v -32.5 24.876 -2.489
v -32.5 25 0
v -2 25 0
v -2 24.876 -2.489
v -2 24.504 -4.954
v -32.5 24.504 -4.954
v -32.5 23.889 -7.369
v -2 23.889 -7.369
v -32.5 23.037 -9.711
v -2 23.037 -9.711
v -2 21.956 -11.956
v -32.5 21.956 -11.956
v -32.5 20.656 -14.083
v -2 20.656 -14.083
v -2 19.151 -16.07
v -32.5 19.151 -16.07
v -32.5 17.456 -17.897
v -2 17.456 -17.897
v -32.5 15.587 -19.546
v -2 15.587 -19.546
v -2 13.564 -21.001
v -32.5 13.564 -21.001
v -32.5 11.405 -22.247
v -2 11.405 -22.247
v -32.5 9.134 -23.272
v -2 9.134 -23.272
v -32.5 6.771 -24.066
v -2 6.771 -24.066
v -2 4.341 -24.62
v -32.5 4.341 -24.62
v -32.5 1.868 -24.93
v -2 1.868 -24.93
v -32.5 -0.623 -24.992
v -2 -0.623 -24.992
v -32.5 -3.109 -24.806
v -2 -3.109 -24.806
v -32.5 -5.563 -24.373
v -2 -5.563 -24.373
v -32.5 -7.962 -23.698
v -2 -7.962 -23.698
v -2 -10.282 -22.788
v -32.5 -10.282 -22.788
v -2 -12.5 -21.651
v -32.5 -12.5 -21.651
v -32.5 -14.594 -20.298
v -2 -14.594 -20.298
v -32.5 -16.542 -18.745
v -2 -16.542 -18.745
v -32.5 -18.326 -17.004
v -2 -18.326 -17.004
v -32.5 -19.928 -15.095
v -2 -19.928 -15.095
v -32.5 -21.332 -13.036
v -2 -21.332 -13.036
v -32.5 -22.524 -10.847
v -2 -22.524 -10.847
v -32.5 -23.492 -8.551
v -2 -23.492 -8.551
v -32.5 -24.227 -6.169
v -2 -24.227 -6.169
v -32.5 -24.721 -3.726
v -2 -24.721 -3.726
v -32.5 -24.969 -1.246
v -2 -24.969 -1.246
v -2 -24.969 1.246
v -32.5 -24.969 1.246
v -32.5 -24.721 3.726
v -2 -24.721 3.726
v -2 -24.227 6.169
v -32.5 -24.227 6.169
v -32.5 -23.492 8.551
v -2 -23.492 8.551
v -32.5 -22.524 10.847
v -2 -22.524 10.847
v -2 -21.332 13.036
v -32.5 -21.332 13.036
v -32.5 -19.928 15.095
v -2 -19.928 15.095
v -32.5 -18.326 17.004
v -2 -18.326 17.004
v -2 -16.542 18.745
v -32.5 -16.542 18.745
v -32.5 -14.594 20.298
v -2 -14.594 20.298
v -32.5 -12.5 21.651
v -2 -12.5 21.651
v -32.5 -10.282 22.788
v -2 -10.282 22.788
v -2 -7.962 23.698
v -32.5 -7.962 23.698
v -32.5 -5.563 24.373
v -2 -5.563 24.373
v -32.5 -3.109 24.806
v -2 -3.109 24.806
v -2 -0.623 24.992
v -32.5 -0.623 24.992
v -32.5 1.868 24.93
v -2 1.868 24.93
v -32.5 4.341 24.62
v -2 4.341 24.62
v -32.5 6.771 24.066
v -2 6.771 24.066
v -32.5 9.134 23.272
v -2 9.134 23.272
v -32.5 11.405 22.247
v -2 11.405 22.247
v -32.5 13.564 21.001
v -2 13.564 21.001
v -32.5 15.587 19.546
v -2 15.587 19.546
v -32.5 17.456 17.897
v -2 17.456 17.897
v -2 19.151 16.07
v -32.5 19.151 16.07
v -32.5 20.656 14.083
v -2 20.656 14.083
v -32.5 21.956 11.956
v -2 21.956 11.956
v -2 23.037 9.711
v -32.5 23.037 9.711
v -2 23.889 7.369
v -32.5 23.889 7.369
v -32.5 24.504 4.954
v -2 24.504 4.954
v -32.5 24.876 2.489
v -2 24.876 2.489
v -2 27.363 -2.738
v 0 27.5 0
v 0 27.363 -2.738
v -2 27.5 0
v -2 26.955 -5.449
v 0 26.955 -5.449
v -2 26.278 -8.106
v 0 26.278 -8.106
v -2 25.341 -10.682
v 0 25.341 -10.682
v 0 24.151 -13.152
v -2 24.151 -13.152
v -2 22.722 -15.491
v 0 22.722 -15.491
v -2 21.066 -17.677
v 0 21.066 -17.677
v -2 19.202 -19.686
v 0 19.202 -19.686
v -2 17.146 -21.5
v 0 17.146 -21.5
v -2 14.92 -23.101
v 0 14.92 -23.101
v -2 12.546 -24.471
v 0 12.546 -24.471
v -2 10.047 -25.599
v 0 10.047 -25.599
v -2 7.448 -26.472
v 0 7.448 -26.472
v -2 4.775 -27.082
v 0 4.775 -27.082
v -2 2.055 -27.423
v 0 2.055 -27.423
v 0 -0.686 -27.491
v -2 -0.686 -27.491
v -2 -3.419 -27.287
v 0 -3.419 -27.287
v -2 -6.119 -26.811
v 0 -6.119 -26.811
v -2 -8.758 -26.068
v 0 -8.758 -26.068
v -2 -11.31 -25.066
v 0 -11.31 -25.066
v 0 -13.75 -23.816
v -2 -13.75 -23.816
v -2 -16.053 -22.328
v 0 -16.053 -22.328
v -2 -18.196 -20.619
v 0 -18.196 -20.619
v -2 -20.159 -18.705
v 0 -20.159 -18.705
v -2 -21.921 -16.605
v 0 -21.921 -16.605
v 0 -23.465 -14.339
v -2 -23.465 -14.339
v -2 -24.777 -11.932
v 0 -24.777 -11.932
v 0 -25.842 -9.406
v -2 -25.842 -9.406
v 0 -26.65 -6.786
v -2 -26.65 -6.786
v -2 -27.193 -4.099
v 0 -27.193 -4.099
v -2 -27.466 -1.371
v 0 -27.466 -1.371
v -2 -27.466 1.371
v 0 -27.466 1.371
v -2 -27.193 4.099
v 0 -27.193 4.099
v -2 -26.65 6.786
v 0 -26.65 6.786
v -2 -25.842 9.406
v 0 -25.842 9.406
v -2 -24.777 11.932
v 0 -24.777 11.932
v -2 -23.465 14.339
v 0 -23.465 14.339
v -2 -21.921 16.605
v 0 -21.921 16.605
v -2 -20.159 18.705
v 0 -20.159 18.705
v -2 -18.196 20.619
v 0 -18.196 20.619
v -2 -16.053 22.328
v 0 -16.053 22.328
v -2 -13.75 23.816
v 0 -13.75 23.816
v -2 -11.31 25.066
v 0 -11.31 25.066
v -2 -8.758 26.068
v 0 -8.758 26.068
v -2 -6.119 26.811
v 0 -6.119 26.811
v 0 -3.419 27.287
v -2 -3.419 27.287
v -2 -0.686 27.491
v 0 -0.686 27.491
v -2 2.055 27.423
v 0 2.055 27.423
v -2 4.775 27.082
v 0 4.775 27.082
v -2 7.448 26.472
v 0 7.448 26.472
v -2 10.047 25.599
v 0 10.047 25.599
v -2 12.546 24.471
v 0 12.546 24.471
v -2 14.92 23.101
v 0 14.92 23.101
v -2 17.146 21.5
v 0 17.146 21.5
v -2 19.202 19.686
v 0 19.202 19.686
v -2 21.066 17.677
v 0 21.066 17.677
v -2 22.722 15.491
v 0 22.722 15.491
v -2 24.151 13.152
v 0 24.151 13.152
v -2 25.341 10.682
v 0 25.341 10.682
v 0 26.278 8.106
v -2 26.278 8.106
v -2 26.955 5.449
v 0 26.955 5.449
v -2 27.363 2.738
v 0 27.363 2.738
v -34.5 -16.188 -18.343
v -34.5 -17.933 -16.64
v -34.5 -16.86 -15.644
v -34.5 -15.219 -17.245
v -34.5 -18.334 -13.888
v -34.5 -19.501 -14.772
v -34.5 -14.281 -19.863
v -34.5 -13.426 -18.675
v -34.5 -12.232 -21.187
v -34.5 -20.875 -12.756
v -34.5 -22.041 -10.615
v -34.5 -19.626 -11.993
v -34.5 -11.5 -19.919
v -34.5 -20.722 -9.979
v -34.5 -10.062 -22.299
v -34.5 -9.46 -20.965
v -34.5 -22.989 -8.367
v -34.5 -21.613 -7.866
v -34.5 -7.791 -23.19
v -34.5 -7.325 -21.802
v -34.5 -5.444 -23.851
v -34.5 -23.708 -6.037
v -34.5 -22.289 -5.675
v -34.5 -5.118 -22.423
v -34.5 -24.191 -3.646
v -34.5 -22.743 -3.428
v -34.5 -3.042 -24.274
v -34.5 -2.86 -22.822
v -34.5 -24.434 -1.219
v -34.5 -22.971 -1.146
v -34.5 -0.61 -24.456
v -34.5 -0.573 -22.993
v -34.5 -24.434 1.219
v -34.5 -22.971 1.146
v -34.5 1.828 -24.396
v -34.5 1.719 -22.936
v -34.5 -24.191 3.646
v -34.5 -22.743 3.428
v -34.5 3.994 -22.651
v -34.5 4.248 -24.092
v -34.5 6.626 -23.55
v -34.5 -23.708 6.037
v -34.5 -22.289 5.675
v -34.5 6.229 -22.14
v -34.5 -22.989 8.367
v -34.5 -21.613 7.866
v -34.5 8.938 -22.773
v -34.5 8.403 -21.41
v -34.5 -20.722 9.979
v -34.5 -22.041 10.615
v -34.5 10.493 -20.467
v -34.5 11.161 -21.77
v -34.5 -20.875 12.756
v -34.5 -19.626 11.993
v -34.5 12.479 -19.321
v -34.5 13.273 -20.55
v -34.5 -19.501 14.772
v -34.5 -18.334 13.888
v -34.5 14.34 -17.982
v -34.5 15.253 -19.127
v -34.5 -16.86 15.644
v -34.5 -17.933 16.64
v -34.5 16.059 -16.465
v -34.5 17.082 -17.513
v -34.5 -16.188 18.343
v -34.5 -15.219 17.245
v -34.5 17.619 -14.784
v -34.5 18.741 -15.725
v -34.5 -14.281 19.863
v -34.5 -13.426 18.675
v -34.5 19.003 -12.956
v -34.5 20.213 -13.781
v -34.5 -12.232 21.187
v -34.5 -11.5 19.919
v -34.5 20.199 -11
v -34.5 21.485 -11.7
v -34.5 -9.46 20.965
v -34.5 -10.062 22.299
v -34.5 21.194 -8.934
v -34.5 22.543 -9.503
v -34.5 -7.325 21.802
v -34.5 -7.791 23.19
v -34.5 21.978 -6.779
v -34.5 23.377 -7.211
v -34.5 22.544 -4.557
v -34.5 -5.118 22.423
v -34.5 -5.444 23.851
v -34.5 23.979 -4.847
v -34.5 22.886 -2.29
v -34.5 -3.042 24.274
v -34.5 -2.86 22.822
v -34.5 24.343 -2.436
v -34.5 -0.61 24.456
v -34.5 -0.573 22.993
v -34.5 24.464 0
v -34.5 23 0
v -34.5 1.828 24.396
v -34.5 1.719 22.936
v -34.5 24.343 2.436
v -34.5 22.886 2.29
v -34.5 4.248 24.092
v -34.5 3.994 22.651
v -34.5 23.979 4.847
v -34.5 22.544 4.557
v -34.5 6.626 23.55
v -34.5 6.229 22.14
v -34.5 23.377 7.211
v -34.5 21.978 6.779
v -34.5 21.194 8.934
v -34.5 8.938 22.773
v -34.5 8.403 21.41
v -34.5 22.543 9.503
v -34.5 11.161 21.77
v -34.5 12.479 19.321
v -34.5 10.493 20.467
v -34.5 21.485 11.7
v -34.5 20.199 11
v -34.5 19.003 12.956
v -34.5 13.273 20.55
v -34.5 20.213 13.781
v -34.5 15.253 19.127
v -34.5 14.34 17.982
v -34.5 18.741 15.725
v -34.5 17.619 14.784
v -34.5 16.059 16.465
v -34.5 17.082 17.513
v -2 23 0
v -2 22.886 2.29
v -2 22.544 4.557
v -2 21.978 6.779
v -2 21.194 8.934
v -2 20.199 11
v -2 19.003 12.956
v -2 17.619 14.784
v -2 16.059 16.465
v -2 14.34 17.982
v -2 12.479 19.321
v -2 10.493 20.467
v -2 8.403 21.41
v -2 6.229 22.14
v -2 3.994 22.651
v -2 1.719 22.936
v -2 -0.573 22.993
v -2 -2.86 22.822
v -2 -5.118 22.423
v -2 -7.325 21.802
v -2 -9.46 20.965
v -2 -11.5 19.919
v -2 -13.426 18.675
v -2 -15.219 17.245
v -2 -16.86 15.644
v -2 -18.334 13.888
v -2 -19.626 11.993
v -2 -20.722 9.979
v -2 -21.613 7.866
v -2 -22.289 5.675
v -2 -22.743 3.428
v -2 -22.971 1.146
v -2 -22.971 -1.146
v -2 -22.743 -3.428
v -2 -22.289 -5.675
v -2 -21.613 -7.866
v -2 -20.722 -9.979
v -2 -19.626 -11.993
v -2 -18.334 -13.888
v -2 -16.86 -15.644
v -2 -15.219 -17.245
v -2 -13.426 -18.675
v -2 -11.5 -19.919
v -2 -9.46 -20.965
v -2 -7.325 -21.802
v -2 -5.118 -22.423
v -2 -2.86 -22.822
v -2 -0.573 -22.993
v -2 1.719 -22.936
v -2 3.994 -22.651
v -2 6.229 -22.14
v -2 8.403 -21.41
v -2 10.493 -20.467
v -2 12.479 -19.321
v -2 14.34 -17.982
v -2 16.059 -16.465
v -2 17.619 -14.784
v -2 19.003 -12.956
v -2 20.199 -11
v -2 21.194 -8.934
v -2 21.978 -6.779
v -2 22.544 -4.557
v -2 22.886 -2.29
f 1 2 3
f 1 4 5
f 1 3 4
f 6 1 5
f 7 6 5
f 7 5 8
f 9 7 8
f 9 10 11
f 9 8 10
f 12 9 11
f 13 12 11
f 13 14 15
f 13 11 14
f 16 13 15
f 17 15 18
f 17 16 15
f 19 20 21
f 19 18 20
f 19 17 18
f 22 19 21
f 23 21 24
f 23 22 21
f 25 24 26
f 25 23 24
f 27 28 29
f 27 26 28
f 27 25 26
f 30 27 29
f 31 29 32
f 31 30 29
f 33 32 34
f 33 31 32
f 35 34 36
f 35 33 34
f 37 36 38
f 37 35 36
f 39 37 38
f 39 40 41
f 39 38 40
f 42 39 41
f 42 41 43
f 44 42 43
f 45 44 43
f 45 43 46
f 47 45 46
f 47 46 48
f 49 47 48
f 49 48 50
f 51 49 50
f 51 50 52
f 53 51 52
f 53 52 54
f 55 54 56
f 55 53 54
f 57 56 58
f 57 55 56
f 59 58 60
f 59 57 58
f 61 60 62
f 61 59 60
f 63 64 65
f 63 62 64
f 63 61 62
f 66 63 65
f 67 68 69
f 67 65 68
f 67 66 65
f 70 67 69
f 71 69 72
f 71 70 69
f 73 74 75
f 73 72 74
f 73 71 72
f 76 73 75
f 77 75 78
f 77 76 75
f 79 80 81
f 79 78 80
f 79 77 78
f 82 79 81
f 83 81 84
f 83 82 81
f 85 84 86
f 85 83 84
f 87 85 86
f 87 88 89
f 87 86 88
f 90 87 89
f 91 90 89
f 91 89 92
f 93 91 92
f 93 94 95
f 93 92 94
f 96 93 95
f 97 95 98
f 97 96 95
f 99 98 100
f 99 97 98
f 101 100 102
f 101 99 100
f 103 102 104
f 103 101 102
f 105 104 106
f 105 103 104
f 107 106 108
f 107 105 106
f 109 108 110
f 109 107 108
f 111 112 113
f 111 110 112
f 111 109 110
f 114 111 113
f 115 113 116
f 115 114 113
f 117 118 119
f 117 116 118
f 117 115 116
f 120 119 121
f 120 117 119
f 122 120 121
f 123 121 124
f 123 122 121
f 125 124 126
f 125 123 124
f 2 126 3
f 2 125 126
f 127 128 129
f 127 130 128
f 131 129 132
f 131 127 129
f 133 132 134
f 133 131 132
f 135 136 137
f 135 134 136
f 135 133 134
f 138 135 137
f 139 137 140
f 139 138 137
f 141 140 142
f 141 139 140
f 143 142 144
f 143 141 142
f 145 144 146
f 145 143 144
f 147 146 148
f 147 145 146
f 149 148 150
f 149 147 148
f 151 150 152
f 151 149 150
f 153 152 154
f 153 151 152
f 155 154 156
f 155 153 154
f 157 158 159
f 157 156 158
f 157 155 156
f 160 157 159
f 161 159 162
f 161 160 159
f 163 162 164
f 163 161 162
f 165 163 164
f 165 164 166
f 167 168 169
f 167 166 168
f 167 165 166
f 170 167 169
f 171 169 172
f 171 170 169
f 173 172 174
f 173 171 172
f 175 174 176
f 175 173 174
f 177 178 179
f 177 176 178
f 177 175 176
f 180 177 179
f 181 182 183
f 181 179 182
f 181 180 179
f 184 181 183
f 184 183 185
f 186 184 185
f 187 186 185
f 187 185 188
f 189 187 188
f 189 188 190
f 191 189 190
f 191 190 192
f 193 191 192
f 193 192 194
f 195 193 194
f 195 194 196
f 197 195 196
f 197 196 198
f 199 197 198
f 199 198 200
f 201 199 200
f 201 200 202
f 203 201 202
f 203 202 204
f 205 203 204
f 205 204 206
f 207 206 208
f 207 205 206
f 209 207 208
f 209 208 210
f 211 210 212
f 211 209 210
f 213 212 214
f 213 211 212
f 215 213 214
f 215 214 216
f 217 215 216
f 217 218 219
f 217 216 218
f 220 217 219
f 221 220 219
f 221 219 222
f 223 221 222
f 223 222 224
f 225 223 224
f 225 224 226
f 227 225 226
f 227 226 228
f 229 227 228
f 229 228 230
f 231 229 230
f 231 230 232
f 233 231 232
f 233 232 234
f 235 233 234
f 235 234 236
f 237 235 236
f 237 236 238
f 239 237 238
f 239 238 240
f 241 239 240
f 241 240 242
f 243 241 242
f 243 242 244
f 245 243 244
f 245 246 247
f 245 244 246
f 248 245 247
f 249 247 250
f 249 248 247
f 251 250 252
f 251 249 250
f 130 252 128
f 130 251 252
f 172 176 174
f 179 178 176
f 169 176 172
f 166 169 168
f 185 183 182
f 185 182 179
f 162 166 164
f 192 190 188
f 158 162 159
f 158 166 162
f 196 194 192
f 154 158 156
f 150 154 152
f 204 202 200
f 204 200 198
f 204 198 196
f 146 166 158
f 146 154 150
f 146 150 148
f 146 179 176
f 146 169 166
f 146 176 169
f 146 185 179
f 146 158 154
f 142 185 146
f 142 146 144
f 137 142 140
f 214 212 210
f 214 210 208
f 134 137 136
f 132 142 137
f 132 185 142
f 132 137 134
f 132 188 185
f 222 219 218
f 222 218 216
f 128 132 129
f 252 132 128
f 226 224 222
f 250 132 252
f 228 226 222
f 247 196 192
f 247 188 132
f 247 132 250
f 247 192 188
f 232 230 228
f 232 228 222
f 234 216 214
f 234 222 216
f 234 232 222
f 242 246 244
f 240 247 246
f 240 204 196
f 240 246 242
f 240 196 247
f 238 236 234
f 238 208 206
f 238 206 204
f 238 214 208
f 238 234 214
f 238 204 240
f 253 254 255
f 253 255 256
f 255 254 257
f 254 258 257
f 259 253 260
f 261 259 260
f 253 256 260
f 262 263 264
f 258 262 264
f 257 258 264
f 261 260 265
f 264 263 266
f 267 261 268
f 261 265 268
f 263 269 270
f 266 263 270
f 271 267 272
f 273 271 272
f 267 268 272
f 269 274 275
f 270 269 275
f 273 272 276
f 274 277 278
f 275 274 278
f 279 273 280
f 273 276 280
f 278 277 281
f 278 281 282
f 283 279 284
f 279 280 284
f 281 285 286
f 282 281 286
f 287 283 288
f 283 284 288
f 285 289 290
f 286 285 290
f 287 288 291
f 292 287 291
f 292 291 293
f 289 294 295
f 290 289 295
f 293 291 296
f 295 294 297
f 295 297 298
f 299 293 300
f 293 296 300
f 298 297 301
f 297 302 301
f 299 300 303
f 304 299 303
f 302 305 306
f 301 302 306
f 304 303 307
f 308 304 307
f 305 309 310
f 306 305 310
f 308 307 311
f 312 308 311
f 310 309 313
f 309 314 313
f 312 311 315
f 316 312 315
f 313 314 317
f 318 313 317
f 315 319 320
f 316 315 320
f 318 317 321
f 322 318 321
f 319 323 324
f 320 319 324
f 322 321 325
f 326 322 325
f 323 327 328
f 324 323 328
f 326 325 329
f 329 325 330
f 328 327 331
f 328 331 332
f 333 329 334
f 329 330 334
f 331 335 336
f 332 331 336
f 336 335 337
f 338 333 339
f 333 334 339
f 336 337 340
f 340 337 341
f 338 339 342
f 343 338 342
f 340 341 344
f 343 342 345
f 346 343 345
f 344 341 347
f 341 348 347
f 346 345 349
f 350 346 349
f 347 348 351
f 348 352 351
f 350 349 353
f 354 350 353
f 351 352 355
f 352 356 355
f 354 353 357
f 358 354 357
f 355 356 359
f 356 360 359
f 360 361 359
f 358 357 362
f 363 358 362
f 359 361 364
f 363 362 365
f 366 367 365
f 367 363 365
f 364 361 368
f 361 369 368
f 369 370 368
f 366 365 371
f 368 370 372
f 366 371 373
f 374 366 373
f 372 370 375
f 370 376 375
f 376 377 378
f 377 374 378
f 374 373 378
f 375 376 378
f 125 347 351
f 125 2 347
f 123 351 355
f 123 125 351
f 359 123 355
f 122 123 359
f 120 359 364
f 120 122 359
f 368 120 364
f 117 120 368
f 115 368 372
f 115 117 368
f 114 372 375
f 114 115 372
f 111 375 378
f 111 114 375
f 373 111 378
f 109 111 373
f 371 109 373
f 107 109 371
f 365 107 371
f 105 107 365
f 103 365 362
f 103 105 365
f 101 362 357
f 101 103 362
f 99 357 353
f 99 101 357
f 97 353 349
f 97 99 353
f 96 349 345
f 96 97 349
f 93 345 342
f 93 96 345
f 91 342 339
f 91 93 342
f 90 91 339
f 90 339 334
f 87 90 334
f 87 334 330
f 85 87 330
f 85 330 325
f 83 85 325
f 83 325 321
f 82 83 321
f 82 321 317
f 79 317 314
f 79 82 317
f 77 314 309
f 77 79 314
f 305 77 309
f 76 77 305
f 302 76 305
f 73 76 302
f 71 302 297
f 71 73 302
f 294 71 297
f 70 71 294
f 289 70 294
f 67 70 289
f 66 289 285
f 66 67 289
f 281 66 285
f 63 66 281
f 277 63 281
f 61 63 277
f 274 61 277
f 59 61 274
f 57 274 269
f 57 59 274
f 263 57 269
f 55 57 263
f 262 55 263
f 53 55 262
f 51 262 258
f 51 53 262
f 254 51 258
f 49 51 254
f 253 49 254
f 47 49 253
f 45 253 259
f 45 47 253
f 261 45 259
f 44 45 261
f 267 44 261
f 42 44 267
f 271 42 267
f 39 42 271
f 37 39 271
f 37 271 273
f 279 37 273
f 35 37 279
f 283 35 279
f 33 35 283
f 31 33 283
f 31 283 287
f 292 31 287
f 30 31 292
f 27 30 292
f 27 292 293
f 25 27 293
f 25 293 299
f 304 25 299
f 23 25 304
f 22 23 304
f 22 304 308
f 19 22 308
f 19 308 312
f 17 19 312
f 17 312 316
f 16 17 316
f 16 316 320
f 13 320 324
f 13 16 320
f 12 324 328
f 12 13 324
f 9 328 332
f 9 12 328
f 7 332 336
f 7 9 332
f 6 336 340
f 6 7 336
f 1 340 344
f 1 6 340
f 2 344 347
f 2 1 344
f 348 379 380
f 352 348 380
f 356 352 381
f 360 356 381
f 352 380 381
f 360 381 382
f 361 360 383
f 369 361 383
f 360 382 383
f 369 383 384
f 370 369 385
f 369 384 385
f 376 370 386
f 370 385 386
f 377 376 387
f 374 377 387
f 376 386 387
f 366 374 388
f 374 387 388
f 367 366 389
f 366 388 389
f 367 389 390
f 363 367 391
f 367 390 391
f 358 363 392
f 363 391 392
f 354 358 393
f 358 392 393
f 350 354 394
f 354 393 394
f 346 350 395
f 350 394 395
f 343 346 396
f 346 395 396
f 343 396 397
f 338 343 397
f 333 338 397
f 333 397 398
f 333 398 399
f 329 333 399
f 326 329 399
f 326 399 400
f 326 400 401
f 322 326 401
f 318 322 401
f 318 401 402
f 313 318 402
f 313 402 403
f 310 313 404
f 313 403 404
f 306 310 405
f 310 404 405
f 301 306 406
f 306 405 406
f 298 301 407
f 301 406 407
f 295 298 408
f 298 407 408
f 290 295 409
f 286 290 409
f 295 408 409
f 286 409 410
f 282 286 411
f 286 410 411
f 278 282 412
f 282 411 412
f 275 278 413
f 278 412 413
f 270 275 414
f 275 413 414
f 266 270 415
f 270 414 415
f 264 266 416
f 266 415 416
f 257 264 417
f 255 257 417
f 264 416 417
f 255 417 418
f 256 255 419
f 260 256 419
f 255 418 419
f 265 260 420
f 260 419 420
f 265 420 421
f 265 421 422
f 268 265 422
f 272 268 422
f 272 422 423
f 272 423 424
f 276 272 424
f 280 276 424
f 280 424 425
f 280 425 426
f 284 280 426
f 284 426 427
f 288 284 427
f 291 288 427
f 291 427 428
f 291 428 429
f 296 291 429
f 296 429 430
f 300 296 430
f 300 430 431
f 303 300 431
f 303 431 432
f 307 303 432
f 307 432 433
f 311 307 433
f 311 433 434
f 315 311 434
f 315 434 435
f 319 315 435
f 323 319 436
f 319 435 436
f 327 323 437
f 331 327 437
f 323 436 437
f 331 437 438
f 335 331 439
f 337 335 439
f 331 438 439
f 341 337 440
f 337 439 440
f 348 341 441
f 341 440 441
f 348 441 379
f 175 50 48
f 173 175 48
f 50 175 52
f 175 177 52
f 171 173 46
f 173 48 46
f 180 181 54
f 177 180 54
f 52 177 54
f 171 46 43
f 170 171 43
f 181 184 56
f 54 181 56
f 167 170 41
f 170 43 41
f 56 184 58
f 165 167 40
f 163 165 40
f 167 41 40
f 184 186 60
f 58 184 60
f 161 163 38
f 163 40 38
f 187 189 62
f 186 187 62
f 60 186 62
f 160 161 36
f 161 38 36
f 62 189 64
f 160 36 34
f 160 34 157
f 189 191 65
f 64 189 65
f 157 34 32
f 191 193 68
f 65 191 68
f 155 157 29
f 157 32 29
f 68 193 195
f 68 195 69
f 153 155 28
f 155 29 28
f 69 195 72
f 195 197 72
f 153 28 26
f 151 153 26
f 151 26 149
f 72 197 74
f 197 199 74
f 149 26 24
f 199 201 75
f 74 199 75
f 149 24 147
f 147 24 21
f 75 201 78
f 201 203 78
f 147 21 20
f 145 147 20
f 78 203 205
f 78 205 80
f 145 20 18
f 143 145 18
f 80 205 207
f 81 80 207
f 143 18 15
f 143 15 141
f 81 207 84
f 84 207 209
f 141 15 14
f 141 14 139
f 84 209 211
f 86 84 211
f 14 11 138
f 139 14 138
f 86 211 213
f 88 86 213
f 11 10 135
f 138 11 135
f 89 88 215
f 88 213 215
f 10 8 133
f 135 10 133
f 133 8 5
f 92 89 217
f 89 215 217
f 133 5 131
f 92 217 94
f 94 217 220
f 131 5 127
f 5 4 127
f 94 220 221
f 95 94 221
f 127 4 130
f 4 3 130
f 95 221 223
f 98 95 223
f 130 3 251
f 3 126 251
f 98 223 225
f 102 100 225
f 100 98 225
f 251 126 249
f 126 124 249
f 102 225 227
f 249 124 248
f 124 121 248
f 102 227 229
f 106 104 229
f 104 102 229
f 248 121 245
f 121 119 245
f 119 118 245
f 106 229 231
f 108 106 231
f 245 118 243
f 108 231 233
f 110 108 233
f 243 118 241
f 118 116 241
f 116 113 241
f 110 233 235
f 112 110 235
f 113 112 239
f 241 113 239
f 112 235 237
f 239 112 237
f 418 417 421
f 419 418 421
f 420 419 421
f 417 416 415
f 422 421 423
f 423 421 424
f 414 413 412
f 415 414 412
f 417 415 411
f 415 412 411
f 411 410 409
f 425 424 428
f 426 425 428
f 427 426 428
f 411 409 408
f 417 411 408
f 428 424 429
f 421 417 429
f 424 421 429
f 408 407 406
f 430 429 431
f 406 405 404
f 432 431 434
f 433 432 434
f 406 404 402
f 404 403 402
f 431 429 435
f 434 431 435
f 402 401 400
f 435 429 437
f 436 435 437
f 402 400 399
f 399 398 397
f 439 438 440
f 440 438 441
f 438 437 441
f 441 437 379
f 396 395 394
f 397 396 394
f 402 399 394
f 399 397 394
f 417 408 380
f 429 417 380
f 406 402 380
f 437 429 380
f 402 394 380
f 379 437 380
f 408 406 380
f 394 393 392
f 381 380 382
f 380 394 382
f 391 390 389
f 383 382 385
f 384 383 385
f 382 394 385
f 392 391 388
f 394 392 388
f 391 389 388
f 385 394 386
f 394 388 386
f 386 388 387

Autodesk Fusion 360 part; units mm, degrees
sketch "Skizze1" plane through (0, 0, 0) normal (0, 0, 1) x (1, 0, 0)
  line L0 (0, 0) -> (0, 27.5)
  line L1 (0, 27.5) -> (-2, 27.5)
  line L2 (-2, 27.5) -> (-2, 25)
  line L3 (-2, 25) -> (-32.5, 25)
  line L4 (-32.5, 25) -> (-34.5, 24.4641)
  line L5 (-34.5, 24.4641) -> (-34.5, 23)
  line L6 (-34.5, 23) -> (-2, 23)
  line L7 (-2, 23) -> (-2, 0)
  line L8 (-2, 0) -> (0, 0)
  dimension "d2" = 27.5
  dimension "d3" = 32.5
  dimension "d4" = 2
  dimension "d5" = 23
  dimension "d6" = 25
  dimension "d7" = 15
  dimension "d8" = 2
revolve "Drehen1" add sketch "Skizze1" angle 360 about axis through (1.75, 0, 0) along (1, 0, 0)
equation "d2 = ( 55 / 2 ) * 1 mm"
equation "d5 = ( 46 / 2 ) * 1 mm"
equation "d6 = ( 50 / 2 ) * 1 mm"
